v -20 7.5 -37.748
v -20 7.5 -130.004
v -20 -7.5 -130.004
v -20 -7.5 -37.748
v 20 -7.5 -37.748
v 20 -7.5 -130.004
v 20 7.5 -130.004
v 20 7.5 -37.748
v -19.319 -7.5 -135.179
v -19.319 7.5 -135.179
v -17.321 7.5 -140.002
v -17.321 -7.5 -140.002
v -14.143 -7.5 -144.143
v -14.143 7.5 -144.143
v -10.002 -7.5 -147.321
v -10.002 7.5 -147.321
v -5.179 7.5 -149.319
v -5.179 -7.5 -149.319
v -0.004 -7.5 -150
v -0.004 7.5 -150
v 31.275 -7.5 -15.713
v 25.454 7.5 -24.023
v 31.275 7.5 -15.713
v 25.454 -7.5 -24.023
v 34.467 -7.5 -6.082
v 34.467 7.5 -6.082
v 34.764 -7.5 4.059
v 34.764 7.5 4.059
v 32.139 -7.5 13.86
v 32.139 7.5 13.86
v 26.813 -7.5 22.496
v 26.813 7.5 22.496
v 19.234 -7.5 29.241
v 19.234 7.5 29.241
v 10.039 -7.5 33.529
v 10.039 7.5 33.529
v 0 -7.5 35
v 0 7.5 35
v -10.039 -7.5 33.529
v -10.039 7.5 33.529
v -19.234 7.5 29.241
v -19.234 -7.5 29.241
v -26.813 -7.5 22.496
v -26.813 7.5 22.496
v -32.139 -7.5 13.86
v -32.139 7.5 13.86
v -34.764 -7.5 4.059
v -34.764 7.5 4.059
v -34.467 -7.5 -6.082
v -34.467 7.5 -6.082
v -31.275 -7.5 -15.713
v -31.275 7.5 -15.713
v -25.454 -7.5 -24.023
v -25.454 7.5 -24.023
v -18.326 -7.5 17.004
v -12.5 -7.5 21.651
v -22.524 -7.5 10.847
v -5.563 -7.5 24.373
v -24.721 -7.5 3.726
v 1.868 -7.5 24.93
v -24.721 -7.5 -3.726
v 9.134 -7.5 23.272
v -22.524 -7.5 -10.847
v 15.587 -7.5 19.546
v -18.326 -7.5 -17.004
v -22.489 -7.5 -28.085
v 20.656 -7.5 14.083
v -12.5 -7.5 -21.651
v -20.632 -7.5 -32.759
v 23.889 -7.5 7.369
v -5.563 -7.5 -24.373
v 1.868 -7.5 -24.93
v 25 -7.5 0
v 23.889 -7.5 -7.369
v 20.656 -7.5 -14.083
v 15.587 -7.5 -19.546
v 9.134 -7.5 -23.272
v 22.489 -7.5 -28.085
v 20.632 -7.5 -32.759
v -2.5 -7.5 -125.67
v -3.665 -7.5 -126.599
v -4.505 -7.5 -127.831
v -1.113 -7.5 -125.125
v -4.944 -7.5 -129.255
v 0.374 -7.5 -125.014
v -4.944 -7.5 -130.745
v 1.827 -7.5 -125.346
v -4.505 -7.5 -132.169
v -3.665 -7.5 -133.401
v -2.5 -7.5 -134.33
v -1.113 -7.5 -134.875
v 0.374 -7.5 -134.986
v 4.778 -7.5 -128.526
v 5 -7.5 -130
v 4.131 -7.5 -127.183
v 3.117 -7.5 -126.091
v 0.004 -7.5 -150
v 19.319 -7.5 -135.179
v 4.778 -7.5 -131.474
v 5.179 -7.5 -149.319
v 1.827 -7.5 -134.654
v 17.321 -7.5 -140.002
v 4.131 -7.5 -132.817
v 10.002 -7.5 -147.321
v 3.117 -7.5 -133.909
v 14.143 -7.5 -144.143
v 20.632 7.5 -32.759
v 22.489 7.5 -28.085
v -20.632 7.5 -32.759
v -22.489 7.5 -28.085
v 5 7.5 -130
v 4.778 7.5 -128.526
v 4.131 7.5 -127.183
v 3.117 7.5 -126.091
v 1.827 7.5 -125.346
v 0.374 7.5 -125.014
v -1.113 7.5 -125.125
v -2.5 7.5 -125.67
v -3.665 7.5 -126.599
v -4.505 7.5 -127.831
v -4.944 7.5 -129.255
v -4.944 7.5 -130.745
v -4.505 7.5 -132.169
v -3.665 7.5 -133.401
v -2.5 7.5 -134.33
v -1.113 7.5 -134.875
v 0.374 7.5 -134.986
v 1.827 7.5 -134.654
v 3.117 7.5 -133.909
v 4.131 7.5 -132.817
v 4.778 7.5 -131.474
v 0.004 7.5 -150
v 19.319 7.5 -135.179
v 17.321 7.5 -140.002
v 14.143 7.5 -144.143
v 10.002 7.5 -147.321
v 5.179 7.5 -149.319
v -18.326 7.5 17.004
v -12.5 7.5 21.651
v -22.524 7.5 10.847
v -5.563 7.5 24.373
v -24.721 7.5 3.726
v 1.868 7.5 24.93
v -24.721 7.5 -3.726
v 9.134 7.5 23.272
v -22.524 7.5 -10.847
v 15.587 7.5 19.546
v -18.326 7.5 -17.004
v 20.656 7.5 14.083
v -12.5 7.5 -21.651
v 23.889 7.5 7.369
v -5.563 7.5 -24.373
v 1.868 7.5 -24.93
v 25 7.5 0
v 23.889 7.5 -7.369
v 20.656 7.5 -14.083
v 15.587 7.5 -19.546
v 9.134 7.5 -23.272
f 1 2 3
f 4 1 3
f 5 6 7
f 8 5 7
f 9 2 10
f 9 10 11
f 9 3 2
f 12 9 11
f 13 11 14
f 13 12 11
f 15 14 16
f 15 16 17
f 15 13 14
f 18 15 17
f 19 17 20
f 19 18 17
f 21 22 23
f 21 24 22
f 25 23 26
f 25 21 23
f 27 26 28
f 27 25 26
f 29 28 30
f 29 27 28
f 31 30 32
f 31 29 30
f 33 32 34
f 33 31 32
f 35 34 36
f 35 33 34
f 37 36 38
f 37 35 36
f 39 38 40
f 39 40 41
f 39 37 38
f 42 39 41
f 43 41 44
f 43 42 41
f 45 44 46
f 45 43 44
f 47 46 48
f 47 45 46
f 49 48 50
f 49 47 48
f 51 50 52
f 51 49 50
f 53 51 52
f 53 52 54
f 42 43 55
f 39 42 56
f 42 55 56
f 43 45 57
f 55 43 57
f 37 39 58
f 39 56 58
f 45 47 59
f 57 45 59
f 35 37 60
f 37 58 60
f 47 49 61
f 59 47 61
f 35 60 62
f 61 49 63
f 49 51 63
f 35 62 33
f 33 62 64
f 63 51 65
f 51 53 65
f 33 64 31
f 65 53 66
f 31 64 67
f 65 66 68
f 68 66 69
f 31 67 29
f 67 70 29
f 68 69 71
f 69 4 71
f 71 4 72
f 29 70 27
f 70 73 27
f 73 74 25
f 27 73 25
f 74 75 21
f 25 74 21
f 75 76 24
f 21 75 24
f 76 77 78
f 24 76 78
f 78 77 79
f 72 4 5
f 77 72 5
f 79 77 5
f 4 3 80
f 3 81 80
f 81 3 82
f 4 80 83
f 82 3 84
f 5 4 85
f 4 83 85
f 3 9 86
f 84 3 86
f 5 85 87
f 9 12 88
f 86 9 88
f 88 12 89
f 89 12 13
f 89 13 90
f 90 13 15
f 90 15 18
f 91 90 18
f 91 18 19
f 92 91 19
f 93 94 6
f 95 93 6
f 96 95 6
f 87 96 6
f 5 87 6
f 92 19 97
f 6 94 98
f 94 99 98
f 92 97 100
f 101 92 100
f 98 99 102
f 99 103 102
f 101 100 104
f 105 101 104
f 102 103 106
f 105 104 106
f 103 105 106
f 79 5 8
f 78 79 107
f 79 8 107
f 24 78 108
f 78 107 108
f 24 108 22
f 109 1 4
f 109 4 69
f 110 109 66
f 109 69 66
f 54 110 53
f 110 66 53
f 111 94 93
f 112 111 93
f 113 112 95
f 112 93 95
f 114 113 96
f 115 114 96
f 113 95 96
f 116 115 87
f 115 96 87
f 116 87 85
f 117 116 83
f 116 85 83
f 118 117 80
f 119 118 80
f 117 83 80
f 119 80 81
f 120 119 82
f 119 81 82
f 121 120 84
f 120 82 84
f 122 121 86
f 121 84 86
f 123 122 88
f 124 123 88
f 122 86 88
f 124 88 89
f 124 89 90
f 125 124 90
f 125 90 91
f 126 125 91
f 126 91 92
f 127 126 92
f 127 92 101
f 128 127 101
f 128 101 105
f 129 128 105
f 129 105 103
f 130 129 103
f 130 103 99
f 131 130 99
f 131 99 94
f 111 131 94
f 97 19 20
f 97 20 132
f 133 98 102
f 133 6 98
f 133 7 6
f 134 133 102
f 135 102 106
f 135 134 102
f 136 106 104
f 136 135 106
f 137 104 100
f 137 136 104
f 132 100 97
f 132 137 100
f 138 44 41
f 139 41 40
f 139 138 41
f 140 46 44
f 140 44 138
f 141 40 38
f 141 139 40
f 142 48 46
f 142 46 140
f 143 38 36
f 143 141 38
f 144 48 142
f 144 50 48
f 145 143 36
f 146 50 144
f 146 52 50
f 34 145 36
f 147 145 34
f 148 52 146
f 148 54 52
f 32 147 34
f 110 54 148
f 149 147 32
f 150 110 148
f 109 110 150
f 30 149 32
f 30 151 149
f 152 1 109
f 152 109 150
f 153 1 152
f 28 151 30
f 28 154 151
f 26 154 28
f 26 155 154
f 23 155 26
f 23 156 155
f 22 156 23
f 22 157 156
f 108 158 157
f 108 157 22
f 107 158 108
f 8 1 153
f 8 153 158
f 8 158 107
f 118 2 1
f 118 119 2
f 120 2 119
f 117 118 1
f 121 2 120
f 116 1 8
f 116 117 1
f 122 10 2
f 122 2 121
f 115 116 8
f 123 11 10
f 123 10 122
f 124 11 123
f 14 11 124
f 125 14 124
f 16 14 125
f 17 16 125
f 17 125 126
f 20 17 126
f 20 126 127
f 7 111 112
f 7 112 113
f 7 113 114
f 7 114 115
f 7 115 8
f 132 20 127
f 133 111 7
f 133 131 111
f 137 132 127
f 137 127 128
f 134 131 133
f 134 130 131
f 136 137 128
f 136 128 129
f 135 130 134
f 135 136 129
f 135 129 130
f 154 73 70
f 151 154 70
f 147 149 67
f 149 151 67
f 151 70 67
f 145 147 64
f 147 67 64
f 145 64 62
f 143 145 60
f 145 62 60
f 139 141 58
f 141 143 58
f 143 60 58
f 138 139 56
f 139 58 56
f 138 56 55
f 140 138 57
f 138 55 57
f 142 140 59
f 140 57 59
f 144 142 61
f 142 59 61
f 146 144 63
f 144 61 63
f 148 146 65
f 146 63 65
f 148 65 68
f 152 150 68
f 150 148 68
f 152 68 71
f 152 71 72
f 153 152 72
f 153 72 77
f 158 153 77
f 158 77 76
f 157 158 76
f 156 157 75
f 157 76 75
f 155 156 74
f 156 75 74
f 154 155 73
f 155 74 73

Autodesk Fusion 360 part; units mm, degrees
sketch "Sketch1" plane through (0, 0, 0) normal (0, 1, 0) x (1, 0, 0)
  circle A0 centre (0, 0) radius 35
  circle A1 centre (0, 0) radius 25
  line L0 (-20, 28.7228) -> (20, 28.7228)
  dimension "d1" = 70
  dimension "d2" = 50
  dimension "d3" = 40
extrude "Extrude1" add sketch "Sketch1" along normal mid plane 15
ref_plane "WorkPlane1" through (0, 0, -50) normal (0, 0, 1) x (1, 0, 0)
sketch "Sketch2" plane through (0, 0, -50) normal (0, 0, 1) x (1, 0, 0)
  line L0 (20, 7.5) -> (-20, 7.5)
  line L1 (-20, 7.5) -> (-20, -7.5)
  line L2 (-20, -7.5) -> (20, -7.5)
  line L3 (20, -7.5) -> (20, 7.5)
  line L4 (20, 7.5) -> (-20, -7.5) construction
  line L5 (-20, 7.5) -> (20, -7.5) construction
  dimension "d7" = 40
  dimension "d8" = 15
extrude "Extrude2" add sketch "Sketch2" along normal blind 23 and the other way blind 100
fillet "Fillet1" radius 20 2 edges at (20, 0, -28.7228) (-20, 0, -28.7228)
fillet "Fillet1" radius 20 2 edges at (20, 0, -150) (-20, 0, -150)
sketch "Sketch3" plane through (0, -7.5, 0) normal (0, -1, 0) x (1, 0, 0)
  circle A0 centre (0, 0) radius 25
  arc A1 (-20, -130) -> (20, -130) centre (0, -130) ccw
  line L0 (20, -130) -> (20, -37.7492)
  arc A2 (25.4545, -24.0222) -> (20, -37.7492) centre (40, -37.7492) ccw
  arc A3 (25.4545, -24.0222) -> (-25.4545, -24.0222) centre (0, 0) ccw
  arc A4 (-20, -37.7492) -> (-25.4545, -24.0222) centre (-40, -37.7492) ccw
  line L1 (-20, -37.7492) -> (-20, -130)
  circle A5 centre (0, -130) radius 5
  dimension "d17" = 10
extrude "Extrude3" cut sketch "Sketch3" against normal through all contours A5
